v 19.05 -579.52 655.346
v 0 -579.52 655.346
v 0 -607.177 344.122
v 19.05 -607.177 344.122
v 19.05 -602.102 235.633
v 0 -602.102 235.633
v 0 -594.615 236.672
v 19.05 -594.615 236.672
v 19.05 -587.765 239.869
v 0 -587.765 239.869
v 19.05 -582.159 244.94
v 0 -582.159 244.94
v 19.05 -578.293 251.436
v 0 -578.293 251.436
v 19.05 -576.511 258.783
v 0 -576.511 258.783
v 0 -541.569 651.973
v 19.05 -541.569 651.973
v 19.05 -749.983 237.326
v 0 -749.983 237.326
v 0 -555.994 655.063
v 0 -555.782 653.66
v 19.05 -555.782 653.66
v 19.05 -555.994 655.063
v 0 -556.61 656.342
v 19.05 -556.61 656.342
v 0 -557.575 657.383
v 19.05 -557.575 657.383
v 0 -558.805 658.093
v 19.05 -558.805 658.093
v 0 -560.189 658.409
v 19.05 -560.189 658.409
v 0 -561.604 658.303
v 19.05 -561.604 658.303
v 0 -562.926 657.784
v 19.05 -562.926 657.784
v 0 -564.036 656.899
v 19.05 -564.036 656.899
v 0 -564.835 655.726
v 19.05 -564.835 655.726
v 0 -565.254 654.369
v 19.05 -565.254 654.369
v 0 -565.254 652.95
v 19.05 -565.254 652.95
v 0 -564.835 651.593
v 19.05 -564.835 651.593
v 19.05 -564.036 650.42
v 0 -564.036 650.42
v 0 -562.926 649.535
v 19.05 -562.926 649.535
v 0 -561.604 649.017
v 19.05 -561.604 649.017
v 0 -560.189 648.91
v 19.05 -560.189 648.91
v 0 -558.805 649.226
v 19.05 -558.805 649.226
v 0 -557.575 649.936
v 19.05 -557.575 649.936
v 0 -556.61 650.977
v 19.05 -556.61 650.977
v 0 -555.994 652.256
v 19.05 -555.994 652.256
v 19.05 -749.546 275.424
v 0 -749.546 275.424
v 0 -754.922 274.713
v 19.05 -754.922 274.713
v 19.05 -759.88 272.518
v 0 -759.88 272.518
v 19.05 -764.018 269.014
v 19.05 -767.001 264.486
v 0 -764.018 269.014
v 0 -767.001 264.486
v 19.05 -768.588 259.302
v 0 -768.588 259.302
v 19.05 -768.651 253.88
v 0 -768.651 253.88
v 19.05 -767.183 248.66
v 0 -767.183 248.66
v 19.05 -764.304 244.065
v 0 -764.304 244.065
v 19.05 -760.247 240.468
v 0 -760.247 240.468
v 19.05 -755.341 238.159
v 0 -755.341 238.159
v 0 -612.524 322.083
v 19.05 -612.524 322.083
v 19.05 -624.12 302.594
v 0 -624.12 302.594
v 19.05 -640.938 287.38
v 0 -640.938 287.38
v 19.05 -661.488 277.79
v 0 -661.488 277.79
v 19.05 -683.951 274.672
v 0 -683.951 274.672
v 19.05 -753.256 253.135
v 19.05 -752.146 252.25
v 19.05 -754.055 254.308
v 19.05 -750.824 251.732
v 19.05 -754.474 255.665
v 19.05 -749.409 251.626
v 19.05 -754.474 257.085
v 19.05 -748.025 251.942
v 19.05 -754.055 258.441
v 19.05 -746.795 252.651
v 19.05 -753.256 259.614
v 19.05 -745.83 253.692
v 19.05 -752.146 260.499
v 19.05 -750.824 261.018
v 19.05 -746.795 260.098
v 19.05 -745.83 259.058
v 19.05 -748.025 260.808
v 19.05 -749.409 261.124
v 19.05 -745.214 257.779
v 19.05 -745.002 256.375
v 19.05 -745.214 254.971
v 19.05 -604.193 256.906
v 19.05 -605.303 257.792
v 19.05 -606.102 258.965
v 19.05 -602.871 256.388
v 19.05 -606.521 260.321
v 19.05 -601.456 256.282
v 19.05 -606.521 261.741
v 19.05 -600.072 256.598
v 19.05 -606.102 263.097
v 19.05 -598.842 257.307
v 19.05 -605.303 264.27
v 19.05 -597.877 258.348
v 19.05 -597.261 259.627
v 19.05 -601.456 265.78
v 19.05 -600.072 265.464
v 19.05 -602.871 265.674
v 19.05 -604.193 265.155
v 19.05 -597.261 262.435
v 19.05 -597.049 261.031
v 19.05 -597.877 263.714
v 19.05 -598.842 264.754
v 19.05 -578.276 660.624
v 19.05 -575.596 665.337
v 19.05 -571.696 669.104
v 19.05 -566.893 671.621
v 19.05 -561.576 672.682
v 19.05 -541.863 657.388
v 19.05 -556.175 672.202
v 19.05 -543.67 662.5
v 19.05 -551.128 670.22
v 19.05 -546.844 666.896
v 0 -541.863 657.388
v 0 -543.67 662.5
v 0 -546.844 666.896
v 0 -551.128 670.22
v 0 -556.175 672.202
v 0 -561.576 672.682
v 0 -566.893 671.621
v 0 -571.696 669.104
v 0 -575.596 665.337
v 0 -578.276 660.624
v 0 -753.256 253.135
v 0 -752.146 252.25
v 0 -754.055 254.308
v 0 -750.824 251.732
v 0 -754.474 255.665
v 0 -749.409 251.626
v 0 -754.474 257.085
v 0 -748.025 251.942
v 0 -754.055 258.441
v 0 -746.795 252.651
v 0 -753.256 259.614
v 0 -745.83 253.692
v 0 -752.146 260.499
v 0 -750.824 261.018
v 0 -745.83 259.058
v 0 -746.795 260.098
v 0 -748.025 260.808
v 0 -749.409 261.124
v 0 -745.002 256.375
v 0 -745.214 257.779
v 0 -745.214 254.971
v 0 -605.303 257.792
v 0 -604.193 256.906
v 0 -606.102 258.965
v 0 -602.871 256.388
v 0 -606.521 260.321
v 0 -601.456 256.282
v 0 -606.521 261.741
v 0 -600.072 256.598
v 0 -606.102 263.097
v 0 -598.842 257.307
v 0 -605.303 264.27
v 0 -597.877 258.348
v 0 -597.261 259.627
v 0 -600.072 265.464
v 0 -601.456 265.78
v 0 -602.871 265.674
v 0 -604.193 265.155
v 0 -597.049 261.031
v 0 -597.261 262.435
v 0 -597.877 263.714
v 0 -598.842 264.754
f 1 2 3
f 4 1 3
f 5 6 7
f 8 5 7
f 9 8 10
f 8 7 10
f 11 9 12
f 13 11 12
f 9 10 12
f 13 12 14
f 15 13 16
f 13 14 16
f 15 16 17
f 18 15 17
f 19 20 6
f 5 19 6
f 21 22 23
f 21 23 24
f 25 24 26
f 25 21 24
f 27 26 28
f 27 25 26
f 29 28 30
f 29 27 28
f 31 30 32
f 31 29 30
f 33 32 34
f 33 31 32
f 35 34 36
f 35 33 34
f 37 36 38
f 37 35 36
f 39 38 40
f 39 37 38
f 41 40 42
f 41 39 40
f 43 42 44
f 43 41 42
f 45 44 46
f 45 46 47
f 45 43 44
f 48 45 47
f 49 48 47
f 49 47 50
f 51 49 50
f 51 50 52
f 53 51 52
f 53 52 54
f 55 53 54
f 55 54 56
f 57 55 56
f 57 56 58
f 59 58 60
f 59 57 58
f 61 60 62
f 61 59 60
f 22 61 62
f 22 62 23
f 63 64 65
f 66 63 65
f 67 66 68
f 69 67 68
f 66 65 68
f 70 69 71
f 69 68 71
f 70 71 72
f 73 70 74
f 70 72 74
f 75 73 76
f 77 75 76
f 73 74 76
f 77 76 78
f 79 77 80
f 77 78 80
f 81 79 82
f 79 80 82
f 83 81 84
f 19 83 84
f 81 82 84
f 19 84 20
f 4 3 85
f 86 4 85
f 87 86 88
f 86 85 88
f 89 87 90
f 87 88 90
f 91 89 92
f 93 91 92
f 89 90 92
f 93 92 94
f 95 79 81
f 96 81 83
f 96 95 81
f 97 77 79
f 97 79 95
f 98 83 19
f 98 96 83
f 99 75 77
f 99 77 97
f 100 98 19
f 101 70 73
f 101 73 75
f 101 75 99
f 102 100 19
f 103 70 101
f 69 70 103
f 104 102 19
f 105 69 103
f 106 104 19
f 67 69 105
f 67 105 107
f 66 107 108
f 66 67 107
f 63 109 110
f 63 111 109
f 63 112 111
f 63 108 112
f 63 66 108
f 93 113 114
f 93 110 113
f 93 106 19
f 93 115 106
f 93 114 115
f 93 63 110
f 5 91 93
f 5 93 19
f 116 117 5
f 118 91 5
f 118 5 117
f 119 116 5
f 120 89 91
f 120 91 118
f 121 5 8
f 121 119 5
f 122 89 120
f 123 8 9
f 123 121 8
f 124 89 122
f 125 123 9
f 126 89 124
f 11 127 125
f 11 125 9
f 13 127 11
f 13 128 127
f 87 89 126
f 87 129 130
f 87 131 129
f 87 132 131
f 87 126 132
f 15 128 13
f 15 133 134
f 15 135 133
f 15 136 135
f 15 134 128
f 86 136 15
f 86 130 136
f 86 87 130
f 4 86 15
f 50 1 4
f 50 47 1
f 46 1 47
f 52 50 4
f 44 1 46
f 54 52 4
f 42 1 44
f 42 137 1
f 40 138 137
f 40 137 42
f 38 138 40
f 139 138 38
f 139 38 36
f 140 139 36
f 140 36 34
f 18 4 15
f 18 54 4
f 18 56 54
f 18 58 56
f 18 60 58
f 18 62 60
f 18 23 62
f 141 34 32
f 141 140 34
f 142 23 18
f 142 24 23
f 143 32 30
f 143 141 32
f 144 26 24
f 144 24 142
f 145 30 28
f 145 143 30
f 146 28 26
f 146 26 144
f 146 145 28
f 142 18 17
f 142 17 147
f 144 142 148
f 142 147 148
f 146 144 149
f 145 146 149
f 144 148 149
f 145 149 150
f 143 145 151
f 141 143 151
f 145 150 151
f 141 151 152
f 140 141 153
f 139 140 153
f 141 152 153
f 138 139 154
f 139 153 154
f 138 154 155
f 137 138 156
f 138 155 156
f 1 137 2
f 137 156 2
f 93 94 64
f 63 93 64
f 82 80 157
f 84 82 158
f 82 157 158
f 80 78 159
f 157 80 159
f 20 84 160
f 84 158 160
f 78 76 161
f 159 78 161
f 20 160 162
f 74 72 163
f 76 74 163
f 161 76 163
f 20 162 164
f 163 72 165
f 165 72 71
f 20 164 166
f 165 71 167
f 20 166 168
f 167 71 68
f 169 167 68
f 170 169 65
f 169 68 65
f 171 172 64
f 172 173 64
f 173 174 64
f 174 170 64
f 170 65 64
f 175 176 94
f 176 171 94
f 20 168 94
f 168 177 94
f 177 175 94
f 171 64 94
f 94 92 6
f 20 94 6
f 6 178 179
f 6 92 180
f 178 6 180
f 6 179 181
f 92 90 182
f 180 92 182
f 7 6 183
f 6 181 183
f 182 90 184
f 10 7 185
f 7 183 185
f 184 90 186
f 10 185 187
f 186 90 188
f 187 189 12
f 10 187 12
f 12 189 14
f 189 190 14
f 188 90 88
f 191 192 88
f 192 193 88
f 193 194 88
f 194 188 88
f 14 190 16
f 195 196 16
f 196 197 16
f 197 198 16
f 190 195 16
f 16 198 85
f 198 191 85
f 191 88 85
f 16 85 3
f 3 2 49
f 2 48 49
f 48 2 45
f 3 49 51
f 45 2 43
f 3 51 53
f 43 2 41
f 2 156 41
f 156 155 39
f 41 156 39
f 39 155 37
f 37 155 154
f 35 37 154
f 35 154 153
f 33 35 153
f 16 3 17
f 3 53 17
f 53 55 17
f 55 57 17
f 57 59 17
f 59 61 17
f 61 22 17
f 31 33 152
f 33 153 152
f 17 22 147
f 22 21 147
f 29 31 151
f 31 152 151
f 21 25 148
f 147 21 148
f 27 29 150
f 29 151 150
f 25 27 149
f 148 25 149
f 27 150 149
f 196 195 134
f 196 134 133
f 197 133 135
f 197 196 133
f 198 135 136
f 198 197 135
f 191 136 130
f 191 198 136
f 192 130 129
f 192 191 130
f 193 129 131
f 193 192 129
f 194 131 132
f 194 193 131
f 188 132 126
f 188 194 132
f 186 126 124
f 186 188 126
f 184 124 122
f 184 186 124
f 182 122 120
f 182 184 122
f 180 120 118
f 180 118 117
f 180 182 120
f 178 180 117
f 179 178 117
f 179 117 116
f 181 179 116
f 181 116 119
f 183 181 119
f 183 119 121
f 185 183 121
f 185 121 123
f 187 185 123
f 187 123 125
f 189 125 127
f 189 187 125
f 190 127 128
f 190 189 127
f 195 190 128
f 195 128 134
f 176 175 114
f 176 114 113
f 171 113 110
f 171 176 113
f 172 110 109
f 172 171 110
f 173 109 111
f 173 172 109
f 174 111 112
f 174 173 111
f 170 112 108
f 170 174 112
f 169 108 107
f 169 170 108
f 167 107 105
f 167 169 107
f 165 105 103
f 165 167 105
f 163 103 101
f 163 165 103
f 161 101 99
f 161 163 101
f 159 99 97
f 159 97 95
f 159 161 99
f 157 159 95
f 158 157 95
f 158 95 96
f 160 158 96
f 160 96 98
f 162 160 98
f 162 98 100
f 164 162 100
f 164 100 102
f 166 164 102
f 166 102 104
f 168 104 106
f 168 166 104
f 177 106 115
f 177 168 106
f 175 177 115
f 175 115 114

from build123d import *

# Parameters (mm, degrees)
F2_R     = 4.7625
F3_DEPTH = 19.05


with BuildPart() as f3:
    # F2 (on Right) → F3 (new body)
    with BuildSketch(Plane.YZ):
        with BuildLine():
            ThreePointArc((-749.54648, 275.423549), (-768.813366, 256.592933), (-749.98275, 237.326046))
            Line((-749.98275, 237.326046), (-602.102315, 235.632607))
            ThreePointArc((-602.102315, 235.632607), (-584.771859, 242.194496), (-576.511176, 258.78257))
            Line((-576.511176, 258.78257), (-541.569312, 651.973339))
            ThreePointArc((-541.569312, 651.973339), (-558.858252, 672.634838), (-579.519752, 655.345898))
            Line((-579.519752, 655.345898), (-607.177403, 344.122272))
            ThreePointArc((-607.177403, 344.122272), (-631.959454, 294.358051), (-683.950822, 274.672386))
            Line((-683.950822, 274.672386), (-749.54648, 275.423549))
        make_face()
        with Locations((-749.764615, 256.374798)):
            Circle(F2_R, mode=Mode.SUBTRACT)
        with Locations((-601.811469, 261.030942)):
            Circle(F2_R, mode=Mode.SUBTRACT)
        with Locations((-560.544532, 653.659618)):
            Circle(F2_R, mode=Mode.SUBTRACT)
    extrude(amount=F3_DEPTH)


solid = f3.part
